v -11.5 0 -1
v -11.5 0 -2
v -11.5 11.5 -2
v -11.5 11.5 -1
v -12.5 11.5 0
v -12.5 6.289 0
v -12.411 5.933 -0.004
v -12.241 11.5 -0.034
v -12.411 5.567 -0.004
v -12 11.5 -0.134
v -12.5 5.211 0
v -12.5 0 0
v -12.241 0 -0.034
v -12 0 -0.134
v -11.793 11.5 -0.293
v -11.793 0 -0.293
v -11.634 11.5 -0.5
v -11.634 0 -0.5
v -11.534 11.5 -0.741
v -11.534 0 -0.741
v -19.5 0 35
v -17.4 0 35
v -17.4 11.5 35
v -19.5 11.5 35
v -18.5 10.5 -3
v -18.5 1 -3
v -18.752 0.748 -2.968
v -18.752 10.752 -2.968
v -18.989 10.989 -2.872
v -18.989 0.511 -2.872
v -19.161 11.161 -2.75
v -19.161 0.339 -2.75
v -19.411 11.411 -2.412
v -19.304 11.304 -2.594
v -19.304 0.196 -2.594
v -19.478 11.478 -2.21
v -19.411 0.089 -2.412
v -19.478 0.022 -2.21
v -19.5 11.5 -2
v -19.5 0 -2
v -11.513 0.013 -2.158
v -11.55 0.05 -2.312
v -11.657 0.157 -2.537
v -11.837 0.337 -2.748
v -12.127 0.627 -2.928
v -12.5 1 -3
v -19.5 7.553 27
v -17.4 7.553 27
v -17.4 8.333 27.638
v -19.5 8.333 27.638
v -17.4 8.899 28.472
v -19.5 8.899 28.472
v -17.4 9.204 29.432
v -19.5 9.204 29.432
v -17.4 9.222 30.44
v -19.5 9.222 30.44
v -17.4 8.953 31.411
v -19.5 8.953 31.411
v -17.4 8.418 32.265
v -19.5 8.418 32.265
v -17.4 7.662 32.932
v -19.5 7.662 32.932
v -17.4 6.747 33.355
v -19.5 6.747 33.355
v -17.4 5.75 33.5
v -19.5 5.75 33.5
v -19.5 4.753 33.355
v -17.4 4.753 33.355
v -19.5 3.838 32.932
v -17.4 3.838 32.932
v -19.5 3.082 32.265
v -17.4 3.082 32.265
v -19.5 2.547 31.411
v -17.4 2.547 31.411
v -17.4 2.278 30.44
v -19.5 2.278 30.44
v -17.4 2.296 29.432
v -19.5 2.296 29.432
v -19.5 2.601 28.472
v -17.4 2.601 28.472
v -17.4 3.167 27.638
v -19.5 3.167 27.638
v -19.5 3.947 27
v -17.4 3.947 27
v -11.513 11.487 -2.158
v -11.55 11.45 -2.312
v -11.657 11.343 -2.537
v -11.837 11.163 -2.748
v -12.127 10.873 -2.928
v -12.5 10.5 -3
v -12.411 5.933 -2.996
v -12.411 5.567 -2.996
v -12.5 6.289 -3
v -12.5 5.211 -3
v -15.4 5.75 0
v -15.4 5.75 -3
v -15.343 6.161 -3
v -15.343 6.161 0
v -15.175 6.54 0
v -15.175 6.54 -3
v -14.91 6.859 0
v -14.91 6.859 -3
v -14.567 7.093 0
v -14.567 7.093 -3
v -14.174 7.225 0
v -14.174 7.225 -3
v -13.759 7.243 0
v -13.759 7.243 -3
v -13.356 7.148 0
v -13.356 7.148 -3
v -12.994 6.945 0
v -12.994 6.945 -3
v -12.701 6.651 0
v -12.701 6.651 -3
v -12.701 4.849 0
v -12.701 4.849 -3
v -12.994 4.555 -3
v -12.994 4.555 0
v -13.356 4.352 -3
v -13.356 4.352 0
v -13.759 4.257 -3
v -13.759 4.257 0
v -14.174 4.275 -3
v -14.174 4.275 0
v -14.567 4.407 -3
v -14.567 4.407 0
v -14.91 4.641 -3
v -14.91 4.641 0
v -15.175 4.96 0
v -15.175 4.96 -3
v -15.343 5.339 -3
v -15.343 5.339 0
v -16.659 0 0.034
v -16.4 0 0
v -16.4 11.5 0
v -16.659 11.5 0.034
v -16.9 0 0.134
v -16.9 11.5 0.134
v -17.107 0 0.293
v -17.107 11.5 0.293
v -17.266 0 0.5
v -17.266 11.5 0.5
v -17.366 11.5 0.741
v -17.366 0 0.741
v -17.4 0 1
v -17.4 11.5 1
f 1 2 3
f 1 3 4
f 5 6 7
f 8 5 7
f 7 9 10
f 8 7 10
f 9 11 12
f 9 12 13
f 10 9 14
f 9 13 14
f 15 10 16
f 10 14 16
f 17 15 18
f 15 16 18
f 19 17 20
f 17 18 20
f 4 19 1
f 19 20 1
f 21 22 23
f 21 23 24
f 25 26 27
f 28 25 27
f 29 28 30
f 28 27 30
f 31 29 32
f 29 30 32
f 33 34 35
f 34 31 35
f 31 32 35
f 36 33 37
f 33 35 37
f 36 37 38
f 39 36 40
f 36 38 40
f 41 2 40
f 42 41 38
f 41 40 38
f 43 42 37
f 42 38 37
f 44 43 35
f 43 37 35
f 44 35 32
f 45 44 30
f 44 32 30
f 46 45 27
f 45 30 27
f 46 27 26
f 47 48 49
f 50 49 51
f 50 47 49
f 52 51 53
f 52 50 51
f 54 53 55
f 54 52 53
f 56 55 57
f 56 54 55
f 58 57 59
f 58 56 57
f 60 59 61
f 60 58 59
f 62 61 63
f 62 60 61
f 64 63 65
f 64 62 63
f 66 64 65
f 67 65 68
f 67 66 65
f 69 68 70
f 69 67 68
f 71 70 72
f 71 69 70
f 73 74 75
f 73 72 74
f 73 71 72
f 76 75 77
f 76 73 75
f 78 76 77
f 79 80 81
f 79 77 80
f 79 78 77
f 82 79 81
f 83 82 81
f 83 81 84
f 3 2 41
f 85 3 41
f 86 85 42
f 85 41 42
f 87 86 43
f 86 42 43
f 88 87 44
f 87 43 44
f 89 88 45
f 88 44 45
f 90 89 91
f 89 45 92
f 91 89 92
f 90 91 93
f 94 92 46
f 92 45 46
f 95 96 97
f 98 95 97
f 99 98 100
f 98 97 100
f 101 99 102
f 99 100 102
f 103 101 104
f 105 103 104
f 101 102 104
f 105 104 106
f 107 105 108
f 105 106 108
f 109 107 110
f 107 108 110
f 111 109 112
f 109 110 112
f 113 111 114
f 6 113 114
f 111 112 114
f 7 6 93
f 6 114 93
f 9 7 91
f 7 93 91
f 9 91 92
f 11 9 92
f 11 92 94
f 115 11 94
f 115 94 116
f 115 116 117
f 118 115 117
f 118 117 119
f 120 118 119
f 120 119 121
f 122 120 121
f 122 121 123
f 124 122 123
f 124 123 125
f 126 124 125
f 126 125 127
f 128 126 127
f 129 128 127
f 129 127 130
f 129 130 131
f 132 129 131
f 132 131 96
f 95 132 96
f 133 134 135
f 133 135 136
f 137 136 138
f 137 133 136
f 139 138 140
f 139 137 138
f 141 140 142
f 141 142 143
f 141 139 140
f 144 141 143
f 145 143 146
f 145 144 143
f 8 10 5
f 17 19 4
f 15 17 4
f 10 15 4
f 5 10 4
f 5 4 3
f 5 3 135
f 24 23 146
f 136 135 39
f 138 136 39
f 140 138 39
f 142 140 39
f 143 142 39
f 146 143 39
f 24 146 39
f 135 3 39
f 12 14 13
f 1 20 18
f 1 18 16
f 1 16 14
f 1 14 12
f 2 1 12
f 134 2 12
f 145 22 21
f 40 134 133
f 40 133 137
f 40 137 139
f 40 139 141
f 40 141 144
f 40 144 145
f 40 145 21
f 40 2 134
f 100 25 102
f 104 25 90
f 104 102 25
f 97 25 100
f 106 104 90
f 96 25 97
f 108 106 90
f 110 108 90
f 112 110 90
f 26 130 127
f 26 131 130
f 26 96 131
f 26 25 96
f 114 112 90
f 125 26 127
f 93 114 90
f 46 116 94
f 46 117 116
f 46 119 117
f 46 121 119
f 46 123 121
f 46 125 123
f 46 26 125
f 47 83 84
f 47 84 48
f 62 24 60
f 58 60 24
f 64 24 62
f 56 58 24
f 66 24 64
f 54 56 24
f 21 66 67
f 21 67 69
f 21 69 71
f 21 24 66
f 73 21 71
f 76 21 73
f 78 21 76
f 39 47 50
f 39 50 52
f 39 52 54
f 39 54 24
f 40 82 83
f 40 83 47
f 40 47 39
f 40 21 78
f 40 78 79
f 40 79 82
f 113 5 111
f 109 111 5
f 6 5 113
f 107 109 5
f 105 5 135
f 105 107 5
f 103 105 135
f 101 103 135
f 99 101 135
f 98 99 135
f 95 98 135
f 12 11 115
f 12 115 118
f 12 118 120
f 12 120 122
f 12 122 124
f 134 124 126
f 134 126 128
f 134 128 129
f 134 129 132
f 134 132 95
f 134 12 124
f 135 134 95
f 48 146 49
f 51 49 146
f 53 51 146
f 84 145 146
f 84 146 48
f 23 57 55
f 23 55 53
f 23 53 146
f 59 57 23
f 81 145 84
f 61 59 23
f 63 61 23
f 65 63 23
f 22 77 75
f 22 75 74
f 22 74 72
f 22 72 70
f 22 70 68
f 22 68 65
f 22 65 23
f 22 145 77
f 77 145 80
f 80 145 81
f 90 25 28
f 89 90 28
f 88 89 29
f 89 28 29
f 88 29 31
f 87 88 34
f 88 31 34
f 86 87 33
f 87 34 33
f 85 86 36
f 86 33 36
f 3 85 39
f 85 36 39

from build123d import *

# Parameters (mm, degrees)
BOSS_EXTRUDE2_DEPTH = 11.5
CUT_EXTRUDE1_REACH  = 46.232
SKETCH4_R           = 1.5
CUT_EXTRUDE2_REACH  = 39.699
FILLET2_R           = 1


with BuildPart() as part:
    # Sketch3 → Boss-Extrude2 (new body)
    with BuildSketch(Plane(origin=(0, 0, 0), x_dir=(1, 0, 0), z_dir=(0, 1, 0))):
        Polygon((-19.5, 3), (-11.5, 3), (-11.5, 0), (-17.4, 0), (-17.4, -35), (-19.5, -35), align=None)
    extrude(amount=BOSS_EXTRUDE2_DEPTH)

    # Sketch4 → Cut-Extrude1 (cut, up to next)
    with BuildSketch(Plane(origin=(0, 0, -3), x_dir=(-1, 0, 0), z_dir=(0, 0, -1)), mode=Mode.PRIVATE) as cut_extrude1_sk1:
        with Locations((13.9, 5.75)):
            Circle(SKETCH4_R)
    cut_extrude1_tool1 = extrude(cut_extrude1_sk1.sketch, amount=-CUT_EXTRUDE1_REACH, mode=Mode.PRIVATE) & part.part
    add(cut_extrude1_tool1.solids().sort_by_distance((-13.9, 5.75, -3))[0], mode=Mode.SUBTRACT)

    # Sketch5 → Cut-Extrude2 (cut, up to next)
    with BuildSketch(Plane.ZY.offset(19.5), mode=Mode.PRIVATE) as cut_extrude2_sk1:
        with BuildLine():
            Line((27, 3.947224362), (27, 7.552775638))
            ThreePointArc((27, 7.552775638), (33.5, 5.75), (27, 3.947224362))
        make_face()
    cut_extrude2_tool1 = extrude(cut_extrude2_sk1.sketch, amount=-CUT_EXTRUDE2_REACH, mode=Mode.PRIVATE) & part.part
    add(cut_extrude2_tool1.solids().sort_by_distance((-19.5, 5.75, 30.104819))[0], mode=Mode.SUBTRACT)

    # Fillet2
    # the kernel refuses this fillet: 1 mm, written as the material it adds along each edge
    with BuildSketch(Plane(origin=(-17.4, 0, 0), x_dir=(1, 0, 0), z_dir=(0, 1, 0))) as fillet2_piece_1:
        with BuildLine():
            CenterArc((FILLET2_R, -FILLET2_R), FILLET2_R, 90, 90)
            Line((0, -FILLET2_R), (0, 0))
            Line((0, 0), (FILLET2_R, 0))
        make_face()
    extrude(amount=11.5)
    # the kernel refuses this fillet: 1 mm, written as the material it takes off along each edge
    with BuildSketch(Plane(origin=(-19.5, -2.5, -3), x_dir=(1, 0, 0), z_dir=(0, 1, 0))) as fillet2_2_piece_1:
        with BuildLine():
            CenterArc((FILLET2_R, -FILLET2_R), FILLET2_R, 90, 90)
            Line((0, -FILLET2_R), (0, 0))
            Line((0, 0), (FILLET2_R, 0))
        make_face()
    extrude(amount=16.5, mode=Mode.SUBTRACT)
    with BuildSketch(Plane(origin=(-11.5, -2.5, -3), x_dir=(-1, 0, 0), z_dir=(0, 1, 0)), Plane(origin=(-11.5, -2.5, 0), x_dir=(0, 0, -1), z_dir=(0, 1, 0))) as fillet2_2_piece_2:
        with BuildLine():
            CenterArc((FILLET2_R, FILLET2_R), FILLET2_R, 180, 90)
            Line((0, FILLET2_R), (0, 0))
            Line((0, 0), (FILLET2_R, 0))
        make_face()
    extrude(amount=16.5, mode=Mode.SUBTRACT)
    with BuildSketch(Plane(origin=(-22, 11.5, -3), x_dir=(0, -1, 0), z_dir=(1, 0, 0))) as fillet2_2_piece_3:
        with BuildLine():
            CenterArc((FILLET2_R, -FILLET2_R), FILLET2_R, 90, 90)
            Line((0, -FILLET2_R), (0, 0))
            Line((0, 0), (FILLET2_R, 0))
        make_face()
    extrude(amount=13, mode=Mode.SUBTRACT)
    with BuildSketch(Plane(origin=(-22, 0, -3), x_dir=(0, 1, 0), z_dir=(1, 0, 0))) as fillet2_2_piece_4:
        with BuildLine():
            CenterArc((FILLET2_R, FILLET2_R), FILLET2_R, 180, 90)
            Line((0, FILLET2_R), (0, 0))
            Line((0, 0), (FILLET2_R, 0))
        make_face()
    extrude(amount=13, mode=Mode.SUBTRACT)


solid = part.part
